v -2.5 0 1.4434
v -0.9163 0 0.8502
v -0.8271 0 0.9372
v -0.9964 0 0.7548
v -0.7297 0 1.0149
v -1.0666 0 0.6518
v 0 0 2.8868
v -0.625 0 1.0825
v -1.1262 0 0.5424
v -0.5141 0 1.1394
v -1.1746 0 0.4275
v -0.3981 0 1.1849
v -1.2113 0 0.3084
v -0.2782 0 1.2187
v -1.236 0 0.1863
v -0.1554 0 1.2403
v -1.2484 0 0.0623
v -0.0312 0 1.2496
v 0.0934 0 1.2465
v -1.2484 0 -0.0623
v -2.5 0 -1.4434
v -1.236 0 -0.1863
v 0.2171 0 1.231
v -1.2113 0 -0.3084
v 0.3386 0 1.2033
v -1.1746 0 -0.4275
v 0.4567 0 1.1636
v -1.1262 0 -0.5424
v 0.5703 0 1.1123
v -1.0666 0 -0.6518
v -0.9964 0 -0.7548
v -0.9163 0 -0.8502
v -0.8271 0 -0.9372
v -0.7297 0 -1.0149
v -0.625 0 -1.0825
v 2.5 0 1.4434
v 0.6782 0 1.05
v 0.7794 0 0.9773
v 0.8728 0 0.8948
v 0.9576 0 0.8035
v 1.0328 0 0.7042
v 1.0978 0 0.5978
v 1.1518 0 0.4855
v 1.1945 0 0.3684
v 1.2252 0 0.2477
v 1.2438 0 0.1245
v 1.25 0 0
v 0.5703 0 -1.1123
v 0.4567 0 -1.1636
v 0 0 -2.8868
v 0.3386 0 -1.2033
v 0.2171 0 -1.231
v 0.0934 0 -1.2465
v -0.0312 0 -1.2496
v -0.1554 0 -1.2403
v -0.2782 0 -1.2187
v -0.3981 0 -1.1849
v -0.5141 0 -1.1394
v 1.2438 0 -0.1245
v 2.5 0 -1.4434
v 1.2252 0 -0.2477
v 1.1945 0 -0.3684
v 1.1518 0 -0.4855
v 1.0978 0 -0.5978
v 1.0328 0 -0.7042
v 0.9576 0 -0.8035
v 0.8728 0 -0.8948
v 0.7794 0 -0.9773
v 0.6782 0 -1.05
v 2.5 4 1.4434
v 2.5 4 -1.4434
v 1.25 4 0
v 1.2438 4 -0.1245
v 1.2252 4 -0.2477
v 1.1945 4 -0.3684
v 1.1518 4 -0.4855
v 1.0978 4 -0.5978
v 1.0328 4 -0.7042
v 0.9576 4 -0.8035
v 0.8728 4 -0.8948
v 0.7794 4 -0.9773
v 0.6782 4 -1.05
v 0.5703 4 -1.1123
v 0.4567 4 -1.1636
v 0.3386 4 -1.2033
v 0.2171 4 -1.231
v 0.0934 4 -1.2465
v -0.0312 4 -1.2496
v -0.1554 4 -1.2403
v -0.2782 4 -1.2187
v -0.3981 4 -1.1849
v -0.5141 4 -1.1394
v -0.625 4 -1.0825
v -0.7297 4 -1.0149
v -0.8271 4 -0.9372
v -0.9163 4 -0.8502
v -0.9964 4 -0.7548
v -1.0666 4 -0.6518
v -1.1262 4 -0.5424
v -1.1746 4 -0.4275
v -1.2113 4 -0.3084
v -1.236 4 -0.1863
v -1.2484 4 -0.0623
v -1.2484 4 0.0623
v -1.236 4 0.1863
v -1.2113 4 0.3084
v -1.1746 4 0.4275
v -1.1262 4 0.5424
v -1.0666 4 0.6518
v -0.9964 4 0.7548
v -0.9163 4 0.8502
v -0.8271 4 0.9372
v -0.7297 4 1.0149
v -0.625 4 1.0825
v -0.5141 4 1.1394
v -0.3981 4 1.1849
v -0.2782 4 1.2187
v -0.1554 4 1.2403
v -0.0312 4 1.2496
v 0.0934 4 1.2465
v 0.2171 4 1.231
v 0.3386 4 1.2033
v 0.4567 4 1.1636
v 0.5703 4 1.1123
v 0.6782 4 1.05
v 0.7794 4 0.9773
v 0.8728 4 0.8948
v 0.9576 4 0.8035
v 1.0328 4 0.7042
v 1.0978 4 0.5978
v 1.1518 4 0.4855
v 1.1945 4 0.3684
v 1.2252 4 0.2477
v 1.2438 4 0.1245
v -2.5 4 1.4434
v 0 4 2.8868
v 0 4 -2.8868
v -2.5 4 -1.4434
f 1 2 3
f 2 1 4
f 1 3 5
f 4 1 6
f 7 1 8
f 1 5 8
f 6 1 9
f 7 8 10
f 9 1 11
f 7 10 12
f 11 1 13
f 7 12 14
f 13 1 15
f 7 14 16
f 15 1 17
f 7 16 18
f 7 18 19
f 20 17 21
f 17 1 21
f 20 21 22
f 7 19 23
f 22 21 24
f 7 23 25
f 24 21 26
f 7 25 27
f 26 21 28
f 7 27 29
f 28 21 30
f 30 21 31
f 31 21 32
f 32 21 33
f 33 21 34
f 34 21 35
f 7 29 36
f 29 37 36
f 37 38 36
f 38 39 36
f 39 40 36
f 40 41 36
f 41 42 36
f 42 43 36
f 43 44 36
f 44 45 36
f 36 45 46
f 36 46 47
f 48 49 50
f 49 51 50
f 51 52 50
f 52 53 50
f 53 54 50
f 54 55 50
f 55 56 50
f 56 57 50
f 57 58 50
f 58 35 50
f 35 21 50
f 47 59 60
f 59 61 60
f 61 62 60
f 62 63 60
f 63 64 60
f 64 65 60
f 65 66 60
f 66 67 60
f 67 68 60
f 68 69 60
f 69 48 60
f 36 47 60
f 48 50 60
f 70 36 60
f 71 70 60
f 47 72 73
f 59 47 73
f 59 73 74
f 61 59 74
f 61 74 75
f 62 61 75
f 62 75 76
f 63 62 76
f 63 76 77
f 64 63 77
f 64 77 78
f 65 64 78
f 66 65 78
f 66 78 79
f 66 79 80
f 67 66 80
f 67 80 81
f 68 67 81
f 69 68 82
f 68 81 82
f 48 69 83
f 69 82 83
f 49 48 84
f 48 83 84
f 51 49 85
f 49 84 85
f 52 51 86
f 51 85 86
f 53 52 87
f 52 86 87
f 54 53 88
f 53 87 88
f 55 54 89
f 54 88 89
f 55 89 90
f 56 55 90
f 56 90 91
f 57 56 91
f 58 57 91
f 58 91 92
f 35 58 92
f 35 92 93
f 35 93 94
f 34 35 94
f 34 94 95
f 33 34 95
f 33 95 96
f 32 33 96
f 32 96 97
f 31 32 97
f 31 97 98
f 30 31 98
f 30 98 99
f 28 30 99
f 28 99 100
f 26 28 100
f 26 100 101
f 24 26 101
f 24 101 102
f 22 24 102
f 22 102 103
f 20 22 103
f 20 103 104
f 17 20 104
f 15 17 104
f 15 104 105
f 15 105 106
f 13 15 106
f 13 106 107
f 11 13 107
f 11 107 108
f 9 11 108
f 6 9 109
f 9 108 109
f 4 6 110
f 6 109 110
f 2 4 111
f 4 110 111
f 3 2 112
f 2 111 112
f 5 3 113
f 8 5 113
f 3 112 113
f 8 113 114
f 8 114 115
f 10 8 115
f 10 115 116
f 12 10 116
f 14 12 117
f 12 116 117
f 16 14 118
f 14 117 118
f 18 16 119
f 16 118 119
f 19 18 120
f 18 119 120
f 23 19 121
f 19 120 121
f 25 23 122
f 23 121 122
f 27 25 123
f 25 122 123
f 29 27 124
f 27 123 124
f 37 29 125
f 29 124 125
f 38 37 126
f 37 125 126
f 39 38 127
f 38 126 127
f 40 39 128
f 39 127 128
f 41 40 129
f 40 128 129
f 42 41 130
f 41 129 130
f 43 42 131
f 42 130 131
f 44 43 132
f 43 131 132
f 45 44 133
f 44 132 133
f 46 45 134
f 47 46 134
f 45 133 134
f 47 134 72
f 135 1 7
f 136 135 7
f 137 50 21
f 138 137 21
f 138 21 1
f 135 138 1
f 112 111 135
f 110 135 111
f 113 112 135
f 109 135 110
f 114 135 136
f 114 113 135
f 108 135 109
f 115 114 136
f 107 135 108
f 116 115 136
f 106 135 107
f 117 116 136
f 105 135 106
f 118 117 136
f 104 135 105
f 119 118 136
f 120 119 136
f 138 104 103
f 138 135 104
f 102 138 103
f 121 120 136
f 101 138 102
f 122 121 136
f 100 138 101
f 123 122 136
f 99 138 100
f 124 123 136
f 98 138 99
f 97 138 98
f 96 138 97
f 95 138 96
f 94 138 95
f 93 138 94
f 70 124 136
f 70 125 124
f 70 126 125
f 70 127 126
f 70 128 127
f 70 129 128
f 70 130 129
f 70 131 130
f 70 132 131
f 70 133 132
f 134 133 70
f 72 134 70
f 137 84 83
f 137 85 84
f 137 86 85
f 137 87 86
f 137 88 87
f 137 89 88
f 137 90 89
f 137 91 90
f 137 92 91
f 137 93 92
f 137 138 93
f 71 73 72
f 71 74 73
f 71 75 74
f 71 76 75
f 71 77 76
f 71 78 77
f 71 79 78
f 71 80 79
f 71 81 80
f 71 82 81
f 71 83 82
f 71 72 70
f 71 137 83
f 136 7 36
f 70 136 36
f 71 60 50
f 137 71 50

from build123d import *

# Parameters (mm, degrees)
BOSS_EXTRUDE1_DEPTH       = 4
M3X0_5_TAPPED_HOLE1_D     = 2.5
M3X0_5_TAPPED_HOLE1_DEPTH = 13.5
M3X0_5_TAPPED_HOLE1_TIP   = 0.751075774


with BuildPart() as part:
    # Sketch2 → Boss-Extrude1 (new body)
    with BuildSketch(Plane(origin=(0, 0, 0), x_dir=(1, 0, 0), z_dir=(0, 1, 0))):
        Polygon((1.25, 0.721687836), (-2.5, -1.443375673), (0, -2.886751346), (1.666666667, 0), align=None)
        Polygon((0.833333333, 1.443375673), (-2.5, 1.443375673), (-2.5, -1.443375673), (1.25, 0.721687836), align=None)
        Polygon((0.833333333, 1.443375673), (0, 2.886751346), (-2.5, 1.443375673), align=None)
        Polygon((2.5, 1.443375673), (0, 2.886751346), (0.833333333, 1.443375673), align=None)
        Polygon((1.25, 0.721687836), (2.5, 1.443375673), (0.833333333, 1.443375673), align=None)
        Polygon((1.666666667, 0), (2.5, 1.443375673), (1.25, 0.721687836), align=None)
        Polygon((2.5, -1.443375673), (2.5, 1.443375673), (1.666666667, 0), align=None)
        Polygon((0, -2.886751346), (2.5, -1.443375673), (1.666666667, 0), align=None)
    extrude(amount=BOSS_EXTRUDE1_DEPTH)

    # M3x0.5 Tapped Hole1
    with Locations(Plane(origin=(0, 0, 0), x_dir=(-1, 0, 0), z_dir=(0, -1, 0))):
        with Locations((0, 0)):
            Hole(M3X0_5_TAPPED_HOLE1_D / 2, depth=M3X0_5_TAPPED_HOLE1_DEPTH)
            with Locations((0, 0, -(M3X0_5_TAPPED_HOLE1_DEPTH + M3X0_5_TAPPED_HOLE1_TIP / 2))):  # 118° drill point
                Cone(0, M3X0_5_TAPPED_HOLE1_D / 2, M3X0_5_TAPPED_HOLE1_TIP, mode=Mode.SUBTRACT)


solid = part.part
